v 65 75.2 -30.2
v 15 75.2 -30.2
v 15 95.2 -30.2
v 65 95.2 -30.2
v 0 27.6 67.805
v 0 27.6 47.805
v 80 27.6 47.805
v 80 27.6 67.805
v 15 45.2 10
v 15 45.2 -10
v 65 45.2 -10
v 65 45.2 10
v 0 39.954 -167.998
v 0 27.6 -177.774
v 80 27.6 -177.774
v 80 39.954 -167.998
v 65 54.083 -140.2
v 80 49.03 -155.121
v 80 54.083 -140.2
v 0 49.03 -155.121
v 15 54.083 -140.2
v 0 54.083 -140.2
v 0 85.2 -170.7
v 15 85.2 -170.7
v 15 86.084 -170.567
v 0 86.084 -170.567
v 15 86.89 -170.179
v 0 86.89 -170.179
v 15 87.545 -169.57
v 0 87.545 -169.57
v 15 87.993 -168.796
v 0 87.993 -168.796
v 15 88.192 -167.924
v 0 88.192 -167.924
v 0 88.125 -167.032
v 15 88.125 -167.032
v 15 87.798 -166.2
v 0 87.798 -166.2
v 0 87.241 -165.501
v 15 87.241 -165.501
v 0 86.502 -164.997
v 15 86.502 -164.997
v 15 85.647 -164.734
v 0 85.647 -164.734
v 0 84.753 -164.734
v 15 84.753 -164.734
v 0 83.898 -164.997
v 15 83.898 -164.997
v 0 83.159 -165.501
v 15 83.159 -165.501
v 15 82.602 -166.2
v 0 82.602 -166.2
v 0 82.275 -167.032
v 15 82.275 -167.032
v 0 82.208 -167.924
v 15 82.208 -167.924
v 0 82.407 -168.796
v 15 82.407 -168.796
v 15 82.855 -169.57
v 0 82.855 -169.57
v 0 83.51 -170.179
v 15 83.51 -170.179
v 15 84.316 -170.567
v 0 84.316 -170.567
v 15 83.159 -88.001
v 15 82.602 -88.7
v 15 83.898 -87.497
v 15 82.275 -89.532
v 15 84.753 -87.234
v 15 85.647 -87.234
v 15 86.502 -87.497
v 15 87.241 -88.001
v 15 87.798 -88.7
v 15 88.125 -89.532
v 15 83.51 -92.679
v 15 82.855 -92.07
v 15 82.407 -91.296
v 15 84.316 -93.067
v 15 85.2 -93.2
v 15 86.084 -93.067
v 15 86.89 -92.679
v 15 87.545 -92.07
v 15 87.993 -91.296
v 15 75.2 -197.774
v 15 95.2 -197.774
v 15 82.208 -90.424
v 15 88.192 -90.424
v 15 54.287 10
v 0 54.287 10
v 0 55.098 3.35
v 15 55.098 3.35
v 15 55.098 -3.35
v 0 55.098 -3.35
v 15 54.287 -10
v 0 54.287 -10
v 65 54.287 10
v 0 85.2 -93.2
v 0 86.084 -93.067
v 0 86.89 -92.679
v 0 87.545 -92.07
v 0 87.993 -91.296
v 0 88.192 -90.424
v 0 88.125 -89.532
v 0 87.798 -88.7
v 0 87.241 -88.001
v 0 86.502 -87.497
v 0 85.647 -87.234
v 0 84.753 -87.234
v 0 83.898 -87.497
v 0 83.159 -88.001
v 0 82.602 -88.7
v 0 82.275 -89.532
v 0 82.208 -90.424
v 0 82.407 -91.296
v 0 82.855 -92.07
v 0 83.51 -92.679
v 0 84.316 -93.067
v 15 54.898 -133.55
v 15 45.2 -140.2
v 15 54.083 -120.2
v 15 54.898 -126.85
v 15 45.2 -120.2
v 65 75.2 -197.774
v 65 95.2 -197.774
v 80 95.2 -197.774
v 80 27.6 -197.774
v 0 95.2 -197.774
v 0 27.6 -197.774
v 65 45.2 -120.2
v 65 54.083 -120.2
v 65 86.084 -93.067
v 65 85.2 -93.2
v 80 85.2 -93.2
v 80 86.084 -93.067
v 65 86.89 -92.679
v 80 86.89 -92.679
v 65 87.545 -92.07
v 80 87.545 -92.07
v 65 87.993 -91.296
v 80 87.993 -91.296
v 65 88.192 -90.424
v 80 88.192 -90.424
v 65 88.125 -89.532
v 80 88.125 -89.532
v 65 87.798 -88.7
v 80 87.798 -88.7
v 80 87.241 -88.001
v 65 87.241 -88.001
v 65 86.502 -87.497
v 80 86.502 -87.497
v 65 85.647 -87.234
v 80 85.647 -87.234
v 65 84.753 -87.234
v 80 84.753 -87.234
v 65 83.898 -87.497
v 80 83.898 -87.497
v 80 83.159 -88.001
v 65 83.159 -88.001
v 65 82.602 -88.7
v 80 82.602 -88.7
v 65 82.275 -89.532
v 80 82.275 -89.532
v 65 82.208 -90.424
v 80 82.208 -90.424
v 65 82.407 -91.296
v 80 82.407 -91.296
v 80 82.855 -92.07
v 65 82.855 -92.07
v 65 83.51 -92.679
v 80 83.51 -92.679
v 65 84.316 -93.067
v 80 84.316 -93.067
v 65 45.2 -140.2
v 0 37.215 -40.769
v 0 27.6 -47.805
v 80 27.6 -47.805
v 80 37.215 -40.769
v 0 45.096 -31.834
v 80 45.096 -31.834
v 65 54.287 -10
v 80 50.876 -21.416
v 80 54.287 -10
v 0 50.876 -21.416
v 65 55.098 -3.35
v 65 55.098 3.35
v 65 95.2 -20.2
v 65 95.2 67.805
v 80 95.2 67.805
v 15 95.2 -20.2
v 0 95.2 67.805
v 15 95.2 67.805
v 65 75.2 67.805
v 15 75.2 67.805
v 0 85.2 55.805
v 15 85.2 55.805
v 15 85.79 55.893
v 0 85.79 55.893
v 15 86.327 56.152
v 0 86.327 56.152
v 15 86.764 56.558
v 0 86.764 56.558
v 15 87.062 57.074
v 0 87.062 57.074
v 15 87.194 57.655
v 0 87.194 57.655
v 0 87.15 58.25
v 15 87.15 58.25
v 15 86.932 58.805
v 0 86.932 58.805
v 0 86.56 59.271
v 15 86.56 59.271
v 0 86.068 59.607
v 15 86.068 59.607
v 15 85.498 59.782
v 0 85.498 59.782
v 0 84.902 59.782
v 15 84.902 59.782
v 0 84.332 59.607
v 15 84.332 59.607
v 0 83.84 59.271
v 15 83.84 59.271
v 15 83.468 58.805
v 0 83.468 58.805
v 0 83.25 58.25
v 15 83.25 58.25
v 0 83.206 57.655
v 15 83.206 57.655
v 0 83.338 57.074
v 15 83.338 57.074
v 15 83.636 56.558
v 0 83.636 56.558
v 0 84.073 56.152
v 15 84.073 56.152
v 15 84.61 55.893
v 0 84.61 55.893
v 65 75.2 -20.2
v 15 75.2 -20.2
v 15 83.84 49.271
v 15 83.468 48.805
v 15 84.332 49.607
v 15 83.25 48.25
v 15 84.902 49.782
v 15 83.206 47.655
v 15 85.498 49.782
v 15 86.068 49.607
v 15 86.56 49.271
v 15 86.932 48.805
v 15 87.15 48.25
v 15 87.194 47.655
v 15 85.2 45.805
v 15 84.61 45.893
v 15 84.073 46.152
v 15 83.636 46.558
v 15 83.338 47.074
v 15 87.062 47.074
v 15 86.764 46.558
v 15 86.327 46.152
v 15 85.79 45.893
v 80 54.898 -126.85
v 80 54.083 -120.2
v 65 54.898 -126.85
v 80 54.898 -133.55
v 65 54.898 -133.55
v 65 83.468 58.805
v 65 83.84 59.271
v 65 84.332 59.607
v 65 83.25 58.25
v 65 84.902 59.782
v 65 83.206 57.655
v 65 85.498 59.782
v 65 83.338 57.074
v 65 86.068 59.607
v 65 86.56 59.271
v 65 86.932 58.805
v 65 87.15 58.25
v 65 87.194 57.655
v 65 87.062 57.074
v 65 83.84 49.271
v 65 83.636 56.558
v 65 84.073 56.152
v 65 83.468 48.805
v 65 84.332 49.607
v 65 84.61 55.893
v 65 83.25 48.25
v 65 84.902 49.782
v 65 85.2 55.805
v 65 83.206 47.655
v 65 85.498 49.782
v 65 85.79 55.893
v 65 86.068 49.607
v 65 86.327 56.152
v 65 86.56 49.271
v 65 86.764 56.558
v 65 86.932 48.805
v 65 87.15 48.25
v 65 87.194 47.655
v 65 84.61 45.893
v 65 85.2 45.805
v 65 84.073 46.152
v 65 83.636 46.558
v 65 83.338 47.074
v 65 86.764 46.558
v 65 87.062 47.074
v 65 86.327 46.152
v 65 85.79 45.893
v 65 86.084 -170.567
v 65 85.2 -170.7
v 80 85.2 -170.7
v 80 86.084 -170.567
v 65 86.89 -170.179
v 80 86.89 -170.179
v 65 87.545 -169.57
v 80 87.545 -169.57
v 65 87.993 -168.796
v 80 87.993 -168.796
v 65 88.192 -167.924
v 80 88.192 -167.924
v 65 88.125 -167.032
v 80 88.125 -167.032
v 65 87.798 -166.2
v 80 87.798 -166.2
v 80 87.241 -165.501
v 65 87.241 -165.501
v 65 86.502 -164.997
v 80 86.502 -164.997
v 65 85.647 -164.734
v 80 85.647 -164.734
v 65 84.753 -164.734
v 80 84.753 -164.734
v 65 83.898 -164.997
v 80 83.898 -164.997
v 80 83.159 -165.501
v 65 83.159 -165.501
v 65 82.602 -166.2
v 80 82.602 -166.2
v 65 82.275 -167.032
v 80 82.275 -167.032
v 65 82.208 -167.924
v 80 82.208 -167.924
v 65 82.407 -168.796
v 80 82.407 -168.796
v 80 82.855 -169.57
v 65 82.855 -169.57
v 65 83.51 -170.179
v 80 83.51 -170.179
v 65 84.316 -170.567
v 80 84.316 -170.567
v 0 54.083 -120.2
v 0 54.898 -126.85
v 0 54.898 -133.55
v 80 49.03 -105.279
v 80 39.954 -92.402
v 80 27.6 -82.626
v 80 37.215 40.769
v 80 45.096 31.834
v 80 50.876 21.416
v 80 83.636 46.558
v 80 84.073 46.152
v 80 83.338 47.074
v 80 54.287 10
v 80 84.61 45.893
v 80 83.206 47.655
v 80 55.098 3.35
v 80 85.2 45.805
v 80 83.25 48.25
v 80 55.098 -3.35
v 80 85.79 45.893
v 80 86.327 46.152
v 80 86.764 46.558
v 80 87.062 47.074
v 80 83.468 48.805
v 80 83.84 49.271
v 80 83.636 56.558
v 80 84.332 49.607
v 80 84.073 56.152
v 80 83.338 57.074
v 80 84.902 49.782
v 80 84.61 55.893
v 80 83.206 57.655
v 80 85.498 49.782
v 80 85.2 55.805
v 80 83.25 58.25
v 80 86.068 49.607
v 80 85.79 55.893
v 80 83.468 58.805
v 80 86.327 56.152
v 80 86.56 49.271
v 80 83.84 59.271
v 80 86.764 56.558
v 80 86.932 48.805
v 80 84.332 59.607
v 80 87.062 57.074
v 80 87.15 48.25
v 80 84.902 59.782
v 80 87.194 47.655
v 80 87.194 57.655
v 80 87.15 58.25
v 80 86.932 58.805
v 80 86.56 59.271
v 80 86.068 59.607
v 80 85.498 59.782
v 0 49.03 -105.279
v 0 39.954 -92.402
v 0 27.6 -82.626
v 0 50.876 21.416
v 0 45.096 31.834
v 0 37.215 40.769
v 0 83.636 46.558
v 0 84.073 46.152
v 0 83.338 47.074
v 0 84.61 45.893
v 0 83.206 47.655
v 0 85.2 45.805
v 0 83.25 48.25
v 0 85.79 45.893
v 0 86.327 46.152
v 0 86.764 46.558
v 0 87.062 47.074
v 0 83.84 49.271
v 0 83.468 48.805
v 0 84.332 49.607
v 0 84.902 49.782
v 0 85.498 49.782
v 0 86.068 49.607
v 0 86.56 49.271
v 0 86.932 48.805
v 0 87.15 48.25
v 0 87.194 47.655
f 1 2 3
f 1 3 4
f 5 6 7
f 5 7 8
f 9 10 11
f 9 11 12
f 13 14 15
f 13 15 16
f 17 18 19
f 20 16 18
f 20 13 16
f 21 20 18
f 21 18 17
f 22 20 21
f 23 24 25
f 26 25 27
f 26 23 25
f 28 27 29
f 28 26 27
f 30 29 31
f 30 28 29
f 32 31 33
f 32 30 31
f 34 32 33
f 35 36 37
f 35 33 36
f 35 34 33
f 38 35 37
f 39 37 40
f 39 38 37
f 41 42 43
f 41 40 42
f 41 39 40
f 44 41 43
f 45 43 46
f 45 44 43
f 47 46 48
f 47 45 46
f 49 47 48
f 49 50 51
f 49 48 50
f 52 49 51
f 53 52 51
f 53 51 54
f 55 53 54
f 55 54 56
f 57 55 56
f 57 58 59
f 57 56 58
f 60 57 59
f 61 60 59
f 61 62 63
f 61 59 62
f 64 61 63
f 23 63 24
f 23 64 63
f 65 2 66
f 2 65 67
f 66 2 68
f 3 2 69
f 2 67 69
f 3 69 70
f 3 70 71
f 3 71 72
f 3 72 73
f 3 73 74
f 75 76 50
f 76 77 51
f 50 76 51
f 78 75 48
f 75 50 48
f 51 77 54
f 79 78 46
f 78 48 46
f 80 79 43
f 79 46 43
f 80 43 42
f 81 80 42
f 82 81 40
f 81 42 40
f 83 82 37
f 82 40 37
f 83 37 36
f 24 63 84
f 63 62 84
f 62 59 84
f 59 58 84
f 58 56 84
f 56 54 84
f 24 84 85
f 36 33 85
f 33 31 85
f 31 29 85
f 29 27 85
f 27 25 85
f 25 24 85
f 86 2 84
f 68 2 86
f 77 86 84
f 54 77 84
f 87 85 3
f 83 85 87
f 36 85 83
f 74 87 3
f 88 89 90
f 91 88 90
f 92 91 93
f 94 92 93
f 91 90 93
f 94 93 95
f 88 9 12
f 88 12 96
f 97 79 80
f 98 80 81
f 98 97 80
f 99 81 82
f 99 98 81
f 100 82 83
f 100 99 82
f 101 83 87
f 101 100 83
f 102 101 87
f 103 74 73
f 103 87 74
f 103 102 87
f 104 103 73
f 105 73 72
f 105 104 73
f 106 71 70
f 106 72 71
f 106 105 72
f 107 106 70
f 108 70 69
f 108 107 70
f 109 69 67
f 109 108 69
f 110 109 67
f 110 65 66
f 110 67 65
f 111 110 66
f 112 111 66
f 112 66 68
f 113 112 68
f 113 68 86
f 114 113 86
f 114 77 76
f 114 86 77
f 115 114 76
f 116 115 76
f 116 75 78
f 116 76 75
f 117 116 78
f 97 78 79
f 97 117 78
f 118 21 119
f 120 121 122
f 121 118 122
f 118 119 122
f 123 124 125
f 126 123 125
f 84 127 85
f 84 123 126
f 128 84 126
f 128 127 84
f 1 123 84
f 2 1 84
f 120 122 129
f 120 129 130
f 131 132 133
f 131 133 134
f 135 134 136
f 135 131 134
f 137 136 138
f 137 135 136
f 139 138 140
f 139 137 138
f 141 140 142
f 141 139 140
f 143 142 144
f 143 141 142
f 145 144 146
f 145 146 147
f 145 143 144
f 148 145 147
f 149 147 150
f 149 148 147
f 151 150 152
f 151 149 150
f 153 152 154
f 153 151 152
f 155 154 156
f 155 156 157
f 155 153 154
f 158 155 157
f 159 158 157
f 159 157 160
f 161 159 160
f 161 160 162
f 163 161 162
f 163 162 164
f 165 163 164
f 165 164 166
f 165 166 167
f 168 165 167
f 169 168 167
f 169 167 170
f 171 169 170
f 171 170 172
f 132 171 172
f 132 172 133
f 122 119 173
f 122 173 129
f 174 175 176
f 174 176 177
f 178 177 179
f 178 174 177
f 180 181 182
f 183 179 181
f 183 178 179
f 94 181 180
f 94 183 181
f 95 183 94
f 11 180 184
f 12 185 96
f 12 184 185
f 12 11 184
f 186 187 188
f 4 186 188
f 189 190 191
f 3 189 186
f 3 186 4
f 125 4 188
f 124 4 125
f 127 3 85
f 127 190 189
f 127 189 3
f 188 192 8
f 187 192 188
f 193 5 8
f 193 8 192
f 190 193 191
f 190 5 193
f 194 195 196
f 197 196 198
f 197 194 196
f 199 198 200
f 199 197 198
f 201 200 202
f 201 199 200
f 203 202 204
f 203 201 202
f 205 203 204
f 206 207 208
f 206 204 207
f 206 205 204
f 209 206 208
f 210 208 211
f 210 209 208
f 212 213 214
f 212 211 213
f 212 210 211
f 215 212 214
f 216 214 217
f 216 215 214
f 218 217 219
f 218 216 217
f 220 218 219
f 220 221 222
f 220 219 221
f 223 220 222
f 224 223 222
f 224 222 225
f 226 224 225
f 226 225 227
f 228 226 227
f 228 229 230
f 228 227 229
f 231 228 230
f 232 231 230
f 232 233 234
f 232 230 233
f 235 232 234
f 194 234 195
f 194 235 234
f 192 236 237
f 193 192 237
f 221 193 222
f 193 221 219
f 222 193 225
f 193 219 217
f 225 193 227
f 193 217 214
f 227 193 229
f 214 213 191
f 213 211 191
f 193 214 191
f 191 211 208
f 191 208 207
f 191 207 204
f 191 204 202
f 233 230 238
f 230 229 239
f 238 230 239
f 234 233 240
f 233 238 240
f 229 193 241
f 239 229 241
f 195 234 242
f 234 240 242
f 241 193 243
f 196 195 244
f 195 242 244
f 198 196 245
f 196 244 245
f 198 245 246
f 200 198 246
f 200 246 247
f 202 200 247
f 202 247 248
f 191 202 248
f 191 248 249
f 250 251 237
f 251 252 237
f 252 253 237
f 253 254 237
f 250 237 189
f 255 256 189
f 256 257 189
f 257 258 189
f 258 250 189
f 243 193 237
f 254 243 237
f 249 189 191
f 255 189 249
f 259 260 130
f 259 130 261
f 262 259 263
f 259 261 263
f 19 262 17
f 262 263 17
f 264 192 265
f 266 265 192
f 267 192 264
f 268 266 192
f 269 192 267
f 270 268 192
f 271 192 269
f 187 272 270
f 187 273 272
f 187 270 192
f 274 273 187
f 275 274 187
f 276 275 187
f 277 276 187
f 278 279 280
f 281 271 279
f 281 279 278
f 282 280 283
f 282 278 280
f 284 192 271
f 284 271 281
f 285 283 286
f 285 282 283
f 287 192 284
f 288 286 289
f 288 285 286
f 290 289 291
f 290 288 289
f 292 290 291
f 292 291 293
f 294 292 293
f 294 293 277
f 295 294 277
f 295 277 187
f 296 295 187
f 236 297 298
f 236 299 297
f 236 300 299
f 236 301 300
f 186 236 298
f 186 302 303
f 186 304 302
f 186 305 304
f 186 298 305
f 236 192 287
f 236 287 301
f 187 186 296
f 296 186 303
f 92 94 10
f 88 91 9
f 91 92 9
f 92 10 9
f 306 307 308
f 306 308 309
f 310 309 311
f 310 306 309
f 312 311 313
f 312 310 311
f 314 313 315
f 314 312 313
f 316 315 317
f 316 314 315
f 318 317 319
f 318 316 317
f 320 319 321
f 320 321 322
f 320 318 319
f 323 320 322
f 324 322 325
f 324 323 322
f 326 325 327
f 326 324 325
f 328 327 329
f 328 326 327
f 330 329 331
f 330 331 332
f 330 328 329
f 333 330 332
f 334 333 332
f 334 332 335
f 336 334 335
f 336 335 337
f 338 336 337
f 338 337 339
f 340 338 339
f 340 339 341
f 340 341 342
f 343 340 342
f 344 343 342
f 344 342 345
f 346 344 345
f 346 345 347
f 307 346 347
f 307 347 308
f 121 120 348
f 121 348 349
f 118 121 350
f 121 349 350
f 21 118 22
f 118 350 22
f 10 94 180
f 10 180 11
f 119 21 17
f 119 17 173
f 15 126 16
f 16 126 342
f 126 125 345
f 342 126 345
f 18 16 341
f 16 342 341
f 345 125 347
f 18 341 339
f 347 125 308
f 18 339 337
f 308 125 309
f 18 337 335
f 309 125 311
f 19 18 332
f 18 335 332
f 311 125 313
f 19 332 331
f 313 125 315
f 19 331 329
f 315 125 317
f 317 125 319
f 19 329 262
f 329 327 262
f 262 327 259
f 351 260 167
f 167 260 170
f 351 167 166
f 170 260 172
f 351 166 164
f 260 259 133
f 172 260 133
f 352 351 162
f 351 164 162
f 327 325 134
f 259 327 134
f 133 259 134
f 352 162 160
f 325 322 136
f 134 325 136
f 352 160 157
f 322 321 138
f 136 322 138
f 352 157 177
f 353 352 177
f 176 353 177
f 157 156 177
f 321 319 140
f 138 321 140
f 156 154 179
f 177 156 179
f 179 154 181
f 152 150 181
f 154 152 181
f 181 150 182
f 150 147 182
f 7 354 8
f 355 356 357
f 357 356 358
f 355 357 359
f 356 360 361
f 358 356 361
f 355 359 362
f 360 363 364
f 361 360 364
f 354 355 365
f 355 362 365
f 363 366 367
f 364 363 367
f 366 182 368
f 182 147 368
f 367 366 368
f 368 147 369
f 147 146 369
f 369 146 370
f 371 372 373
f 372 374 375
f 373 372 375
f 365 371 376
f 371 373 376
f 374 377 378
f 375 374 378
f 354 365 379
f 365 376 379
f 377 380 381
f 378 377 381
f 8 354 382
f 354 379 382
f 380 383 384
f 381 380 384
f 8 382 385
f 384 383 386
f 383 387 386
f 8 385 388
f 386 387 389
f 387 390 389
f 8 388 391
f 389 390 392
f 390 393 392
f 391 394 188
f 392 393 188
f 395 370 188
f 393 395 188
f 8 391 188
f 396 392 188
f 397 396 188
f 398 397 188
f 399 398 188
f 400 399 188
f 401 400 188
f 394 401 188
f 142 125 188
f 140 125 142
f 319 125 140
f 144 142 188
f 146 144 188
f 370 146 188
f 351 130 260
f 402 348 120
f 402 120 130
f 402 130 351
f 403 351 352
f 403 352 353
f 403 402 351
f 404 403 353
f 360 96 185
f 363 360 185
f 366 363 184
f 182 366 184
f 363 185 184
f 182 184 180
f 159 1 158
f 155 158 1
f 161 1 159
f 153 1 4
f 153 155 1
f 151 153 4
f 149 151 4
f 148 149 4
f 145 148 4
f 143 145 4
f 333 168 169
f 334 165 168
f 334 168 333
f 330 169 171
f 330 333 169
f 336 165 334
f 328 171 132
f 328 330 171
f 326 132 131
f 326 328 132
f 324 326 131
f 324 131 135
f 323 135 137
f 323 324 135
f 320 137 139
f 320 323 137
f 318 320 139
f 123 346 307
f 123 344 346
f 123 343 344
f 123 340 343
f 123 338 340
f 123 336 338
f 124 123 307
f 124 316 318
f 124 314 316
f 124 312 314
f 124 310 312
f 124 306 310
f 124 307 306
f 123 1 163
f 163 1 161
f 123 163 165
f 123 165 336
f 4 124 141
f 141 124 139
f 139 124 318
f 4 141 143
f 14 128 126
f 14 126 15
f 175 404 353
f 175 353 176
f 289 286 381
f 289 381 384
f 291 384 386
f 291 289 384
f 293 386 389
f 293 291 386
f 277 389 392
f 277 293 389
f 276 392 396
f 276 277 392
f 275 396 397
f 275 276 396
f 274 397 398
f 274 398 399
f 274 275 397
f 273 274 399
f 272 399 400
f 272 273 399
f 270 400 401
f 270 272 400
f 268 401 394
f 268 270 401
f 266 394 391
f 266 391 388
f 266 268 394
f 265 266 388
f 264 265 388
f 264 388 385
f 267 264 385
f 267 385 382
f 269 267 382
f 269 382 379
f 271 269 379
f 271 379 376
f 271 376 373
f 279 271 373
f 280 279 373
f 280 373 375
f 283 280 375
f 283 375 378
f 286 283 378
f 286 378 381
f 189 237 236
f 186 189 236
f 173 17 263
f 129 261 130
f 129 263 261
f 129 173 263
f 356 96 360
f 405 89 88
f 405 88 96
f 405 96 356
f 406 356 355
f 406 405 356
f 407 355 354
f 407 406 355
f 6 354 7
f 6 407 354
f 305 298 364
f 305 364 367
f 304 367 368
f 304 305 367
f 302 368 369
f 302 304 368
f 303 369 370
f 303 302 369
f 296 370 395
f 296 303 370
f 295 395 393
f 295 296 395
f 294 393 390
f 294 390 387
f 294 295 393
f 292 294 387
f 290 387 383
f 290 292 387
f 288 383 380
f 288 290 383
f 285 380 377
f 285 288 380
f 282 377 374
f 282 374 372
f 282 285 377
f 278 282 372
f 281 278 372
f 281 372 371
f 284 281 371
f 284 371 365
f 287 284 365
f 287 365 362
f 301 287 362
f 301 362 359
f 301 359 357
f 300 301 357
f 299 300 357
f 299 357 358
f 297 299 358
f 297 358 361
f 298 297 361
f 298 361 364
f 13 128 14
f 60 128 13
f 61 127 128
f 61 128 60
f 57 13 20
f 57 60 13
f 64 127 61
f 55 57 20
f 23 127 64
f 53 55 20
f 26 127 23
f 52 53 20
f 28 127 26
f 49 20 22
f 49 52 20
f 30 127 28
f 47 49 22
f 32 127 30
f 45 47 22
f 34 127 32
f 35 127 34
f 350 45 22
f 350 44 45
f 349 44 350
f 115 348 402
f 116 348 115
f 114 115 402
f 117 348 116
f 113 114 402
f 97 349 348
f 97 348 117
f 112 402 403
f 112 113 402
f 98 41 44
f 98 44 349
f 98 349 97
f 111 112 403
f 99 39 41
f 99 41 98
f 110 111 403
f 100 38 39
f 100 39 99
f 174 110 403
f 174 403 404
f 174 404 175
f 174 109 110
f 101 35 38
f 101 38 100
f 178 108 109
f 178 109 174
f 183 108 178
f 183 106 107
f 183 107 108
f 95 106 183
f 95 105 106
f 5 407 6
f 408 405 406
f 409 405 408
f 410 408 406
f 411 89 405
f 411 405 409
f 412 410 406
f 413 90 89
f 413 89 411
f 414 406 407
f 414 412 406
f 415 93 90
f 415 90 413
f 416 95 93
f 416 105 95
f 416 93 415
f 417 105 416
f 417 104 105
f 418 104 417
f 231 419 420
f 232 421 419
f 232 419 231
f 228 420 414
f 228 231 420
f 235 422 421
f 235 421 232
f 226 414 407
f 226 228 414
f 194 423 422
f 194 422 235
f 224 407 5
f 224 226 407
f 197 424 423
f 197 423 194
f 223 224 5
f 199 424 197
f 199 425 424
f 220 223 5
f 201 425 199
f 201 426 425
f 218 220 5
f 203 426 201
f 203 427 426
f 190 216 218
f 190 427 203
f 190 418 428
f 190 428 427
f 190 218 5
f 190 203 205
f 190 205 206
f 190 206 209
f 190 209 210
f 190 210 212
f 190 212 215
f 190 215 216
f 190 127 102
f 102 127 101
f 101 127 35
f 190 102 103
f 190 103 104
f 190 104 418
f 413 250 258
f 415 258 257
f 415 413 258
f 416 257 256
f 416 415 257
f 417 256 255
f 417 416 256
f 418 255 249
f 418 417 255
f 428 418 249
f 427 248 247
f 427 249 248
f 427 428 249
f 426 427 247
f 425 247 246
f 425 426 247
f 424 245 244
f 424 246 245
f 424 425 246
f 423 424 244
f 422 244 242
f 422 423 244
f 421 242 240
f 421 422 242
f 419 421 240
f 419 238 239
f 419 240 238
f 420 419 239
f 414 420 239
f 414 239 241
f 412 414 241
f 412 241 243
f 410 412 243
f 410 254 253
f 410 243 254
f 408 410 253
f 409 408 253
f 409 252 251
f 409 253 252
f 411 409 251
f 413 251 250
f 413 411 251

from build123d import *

# Parameters (mm, degrees)
SKETCH_2_R               = 2
SKETCH_2_R_2             = 3
EXTRUDE_1_DEPTH          = 80
CUT_EXTRUDE_2_REACH      = 221.122
CUT_EXTRUDE_2_END_RADIUS = 55.2
SKETCH_6_W               = 15
SKETCH_6_H               = 20
SKETCH_7_W               = 50
SKETCH_7_H               = 20
CUT_EXTRUDE_3_DEPTH      = 265.578124336
CUT_EXTRUDE_4_REACH      = 221.122
CUT_EXTRUDE_4_END_RADIUS = 55
SKETCH_8_W               = 15
SKETCH_8_H               = 20
SKETCH_9_W               = 50
SKETCH_9_H               = 10
EXTRUDE_2_DEPTH          = 20


with BuildPart() as part:
    # Эскиз2 → Бобышка-Вытянуть1 (new body)
    with BuildSketch(Plane(origin=(0, 0, 0), x_dir=(0, 0, -1), z_dir=(1, 0, 0))):
        with BuildLine():
            Line((-47.804602289, 27.6), (-67.804602289, 27.6))
            Line((-67.804602289, 27.6), (-67.804602289, 95.2))
            Line((-67.804602289, 95.2), (197.773522047, 95.2))
            Line((197.773522047, 95.2), (197.773522047, 27.6))
            Line((197.773522047, 27.6), (177.773522047, 27.6))
            ThreePointArc((177.773522047, 27.6), (161.886250902, 44.955327869), (140.2, 54.083269132))
            Line((140.2, 54.083269132), (140.2, 45.2))
            Line((140.2, 45.2), (120.2, 45.2))
            Line((120.2, 45.2), (120.2, 54.083269132))
            ThreePointArc((120.2, 54.083269132), (98.513749098, 44.955327869), (82.626477953, 27.6))
            Line((82.626477953, 27.6), (47.804602289, 27.6))
            ThreePointArc((47.804602289, 27.6), (31.83374449, 45.096038759), (10, 54.286646609))
            Line((10, 54.286646609), (10, 45.2))
            Line((10, 45.2), (-10, 45.2))
            Line((-10, 45.2), (-10, 54.286646609))
            ThreePointArc((-10, 54.286646609), (-31.83374449, 45.096038759), (-47.804602289, 27.6))
        make_face()
        with Locations((-47.804602289, 85.2)):
            Circle(SKETCH_2_R, mode=Mode.SUBTRACT)
        with Locations((-57.804602289, 85.2)):
            Circle(SKETCH_2_R, mode=Mode.SUBTRACT)
        with Locations((90.2, 85.2)):
            Circle(SKETCH_2_R_2, mode=Mode.SUBTRACT)
        with Locations((167.7, 85.2)):
            Circle(SKETCH_2_R_2, mode=Mode.SUBTRACT)
    extrude(amount=EXTRUDE_1_DEPTH)

    # Вырез-Вытянуть2: up to this cylinder (the profile starts inside it)
    cut_extrude_2_end = Plane(origin=(40, 0, 0), z_dir=(-1, 0, 0)) * Cylinder(CUT_EXTRUDE_2_END_RADIUS, 618.644, mode=Mode.PRIVATE)
    # Эскиз6 → Вырез-Вытянуть2 (cut, up to the surface)
    with BuildSketch(Plane.XZ.offset(-45.2), mode=Mode.PRIVATE) as cut_extrude_2_sk1:
        with Locations((7.5, 0)):
            Rectangle(SKETCH_6_W, SKETCH_6_H)
    cut_extrude_2_tool1 = extrude(cut_extrude_2_sk1.sketch, amount=-CUT_EXTRUDE_2_REACH, mode=Mode.PRIVATE) & cut_extrude_2_end
    add(cut_extrude_2_tool1.solids().sort_by_distance((7.5, 45.2, 0))[0], mode=Mode.SUBTRACT)
    # Эскиз6 → Вырез-Вытянуть2 (cut, up to the surface)
    with BuildSketch(Plane.XZ.offset(-45.2), mode=Mode.PRIVATE) as cut_extrude_2_sk2:
        with Locations((72.5, 0)):
            Rectangle(SKETCH_6_W, SKETCH_6_H)
    cut_extrude_2_tool2 = extrude(cut_extrude_2_sk2.sketch, amount=-CUT_EXTRUDE_2_REACH, mode=Mode.PRIVATE) & cut_extrude_2_end
    add(cut_extrude_2_tool2.solids().sort_by_distance((72.5, 45.2, 0))[0], mode=Mode.SUBTRACT)

    # Эскиз7 → Вырез-Вытянуть3 (cut)
    with BuildSketch(Plane(origin=(0, 0, -197.773522047), x_dir=(-1, 0, 0), z_dir=(0, 0, -1))):
        with Locations((-40, 85.2)):
            Rectangle(SKETCH_7_W, SKETCH_7_H)
    extrude(amount=-CUT_EXTRUDE_3_DEPTH, mode=Mode.SUBTRACT)

    # Вырез-Вытянуть4: up to this cylinder (the profile starts inside it)
    cut_extrude_4_end = Plane(origin=(40, 0, -130.2), z_dir=(-1, 0, 0)) * Cylinder(CUT_EXTRUDE_4_END_RADIUS, 618.244, mode=Mode.PRIVATE)
    # Эскиз8 → Вырез-Вытянуть4 (cut, up to the surface)
    with BuildSketch(Plane.XZ.offset(-45.2), mode=Mode.PRIVATE) as cut_extrude_4_sk1:
        with Locations((7.5, -130.2)):
            Rectangle(SKETCH_8_W, SKETCH_8_H)
    cut_extrude_4_tool1 = extrude(cut_extrude_4_sk1.sketch, amount=-CUT_EXTRUDE_4_REACH, mode=Mode.PRIVATE) & cut_extrude_4_end
    add(cut_extrude_4_tool1.solids().sort_by_distance((7.5, 45.2, -130.2))[0], mode=Mode.SUBTRACT)
    # Эскиз8 → Вырез-Вытянуть4 (cut, up to the surface)
    with BuildSketch(Plane.XZ.offset(-45.2), mode=Mode.PRIVATE) as cut_extrude_4_sk2:
        with Locations((72.5, -130.2)):
            Rectangle(SKETCH_8_W, SKETCH_8_H)
    cut_extrude_4_tool2 = extrude(cut_extrude_4_sk2.sketch, amount=-CUT_EXTRUDE_4_REACH, mode=Mode.PRIVATE) & cut_extrude_4_end
    add(cut_extrude_4_tool2.solids().sort_by_distance((72.5, 45.2, -130.2))[0], mode=Mode.SUBTRACT)

    # Эскиз9 → Бобышка-Вытянуть2 (add)
    with BuildSketch(Plane(origin=(0, 75.2, 0), x_dir=(1, 0, 0), z_dir=(0, 1, 0))):
        with Locations((40, 25.2)):
            Rectangle(SKETCH_9_W, SKETCH_9_H)
    extrude(amount=EXTRUDE_2_DEPTH)


solid = part.part
